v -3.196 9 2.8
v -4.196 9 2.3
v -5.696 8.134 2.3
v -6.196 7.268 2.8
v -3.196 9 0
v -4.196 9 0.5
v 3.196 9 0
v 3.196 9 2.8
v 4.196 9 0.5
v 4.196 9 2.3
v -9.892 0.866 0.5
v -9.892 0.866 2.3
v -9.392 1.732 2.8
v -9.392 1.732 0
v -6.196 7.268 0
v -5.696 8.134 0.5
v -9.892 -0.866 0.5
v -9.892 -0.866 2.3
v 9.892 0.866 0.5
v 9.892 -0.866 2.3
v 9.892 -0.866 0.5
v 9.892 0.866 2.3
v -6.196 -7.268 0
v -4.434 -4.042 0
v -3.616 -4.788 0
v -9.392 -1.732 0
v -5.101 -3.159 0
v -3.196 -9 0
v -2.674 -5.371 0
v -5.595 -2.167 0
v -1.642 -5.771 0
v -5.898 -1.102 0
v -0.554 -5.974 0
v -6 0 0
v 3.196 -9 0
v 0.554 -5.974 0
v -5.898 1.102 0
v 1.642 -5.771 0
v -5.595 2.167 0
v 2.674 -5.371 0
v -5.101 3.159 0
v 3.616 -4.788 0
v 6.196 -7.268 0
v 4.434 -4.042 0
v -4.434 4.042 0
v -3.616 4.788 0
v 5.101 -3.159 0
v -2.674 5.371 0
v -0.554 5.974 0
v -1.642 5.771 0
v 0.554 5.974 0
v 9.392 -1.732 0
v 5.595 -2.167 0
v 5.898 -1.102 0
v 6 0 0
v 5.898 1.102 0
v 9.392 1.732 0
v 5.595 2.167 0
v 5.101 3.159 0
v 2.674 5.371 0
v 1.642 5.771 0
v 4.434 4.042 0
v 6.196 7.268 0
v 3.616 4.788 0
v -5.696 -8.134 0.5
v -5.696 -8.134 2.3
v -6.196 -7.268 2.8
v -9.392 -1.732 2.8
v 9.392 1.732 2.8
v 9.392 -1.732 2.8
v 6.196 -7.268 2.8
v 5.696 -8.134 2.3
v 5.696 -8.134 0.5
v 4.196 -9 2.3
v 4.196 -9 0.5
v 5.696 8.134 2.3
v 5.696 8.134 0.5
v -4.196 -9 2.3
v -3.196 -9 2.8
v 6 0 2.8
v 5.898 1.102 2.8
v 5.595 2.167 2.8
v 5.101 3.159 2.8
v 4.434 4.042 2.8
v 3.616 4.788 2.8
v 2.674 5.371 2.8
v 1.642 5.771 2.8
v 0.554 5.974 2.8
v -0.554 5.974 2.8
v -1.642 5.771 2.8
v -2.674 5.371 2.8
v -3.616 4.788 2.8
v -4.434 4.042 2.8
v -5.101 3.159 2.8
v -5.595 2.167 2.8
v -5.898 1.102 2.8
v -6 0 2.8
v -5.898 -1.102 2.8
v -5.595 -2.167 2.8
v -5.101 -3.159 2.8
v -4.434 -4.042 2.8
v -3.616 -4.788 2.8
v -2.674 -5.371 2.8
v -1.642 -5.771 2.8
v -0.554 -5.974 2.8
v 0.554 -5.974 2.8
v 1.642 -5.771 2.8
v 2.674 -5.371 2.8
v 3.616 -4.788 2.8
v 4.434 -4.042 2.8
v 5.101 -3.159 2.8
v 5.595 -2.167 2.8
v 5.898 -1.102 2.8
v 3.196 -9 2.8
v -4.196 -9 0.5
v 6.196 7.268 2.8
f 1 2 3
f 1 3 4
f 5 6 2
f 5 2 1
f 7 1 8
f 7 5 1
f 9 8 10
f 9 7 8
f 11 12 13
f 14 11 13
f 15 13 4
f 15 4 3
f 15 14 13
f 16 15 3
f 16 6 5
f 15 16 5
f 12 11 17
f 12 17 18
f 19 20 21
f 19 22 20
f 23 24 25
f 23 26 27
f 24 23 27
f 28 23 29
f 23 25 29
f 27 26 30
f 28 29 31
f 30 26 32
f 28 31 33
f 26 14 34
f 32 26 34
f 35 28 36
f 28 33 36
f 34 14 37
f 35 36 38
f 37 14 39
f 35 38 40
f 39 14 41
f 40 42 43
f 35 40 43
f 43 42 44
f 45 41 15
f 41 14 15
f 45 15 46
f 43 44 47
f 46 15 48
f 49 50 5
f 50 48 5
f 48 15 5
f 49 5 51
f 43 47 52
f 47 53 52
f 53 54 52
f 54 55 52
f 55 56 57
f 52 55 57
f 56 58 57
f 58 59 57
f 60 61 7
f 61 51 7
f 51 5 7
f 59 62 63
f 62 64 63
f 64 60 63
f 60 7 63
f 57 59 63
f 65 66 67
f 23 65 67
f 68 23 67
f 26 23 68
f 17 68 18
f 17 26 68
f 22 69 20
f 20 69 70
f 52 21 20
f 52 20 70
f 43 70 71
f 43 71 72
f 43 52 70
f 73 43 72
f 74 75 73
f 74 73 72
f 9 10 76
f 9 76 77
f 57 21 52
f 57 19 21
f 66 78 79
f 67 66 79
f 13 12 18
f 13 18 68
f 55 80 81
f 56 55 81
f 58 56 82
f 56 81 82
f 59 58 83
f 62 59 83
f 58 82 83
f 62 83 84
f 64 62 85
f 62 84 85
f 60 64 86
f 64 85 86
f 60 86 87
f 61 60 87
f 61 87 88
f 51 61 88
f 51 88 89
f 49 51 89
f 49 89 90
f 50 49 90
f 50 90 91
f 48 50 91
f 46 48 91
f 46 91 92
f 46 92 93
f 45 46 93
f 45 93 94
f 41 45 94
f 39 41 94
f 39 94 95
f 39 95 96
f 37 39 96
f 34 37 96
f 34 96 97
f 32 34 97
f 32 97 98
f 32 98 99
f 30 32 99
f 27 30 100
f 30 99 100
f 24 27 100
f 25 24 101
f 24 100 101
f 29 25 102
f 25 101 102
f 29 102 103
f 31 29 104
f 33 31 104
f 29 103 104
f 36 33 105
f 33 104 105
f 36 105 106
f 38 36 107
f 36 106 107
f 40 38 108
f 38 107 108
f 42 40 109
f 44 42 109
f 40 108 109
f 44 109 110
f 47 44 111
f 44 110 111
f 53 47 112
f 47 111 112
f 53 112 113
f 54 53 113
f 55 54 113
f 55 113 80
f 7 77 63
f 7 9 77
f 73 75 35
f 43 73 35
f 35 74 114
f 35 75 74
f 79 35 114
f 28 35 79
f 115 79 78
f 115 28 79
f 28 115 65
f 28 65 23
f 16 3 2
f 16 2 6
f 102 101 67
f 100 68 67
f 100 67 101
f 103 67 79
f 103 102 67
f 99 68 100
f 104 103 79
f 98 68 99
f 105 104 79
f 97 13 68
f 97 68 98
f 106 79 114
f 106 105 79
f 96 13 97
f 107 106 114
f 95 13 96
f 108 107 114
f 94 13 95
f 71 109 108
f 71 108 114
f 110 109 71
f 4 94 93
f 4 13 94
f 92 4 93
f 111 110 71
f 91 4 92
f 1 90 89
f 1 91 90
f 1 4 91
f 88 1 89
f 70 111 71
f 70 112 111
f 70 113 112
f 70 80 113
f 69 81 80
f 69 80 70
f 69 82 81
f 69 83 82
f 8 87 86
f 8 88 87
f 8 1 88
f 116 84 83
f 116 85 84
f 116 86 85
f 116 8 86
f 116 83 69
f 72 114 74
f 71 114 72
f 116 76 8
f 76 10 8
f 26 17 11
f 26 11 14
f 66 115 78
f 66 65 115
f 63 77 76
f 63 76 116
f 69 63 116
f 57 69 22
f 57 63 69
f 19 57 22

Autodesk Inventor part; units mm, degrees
ref_plane "YZ Plane" through (0, 0, 0) normal (1, 0, 0) x (0, 1, 0)
ref_plane "XZ Plane" through (0, 0, 0) normal (0, 1, 0) x (-1, 0, 0)
ref_plane "XY Plane" through (0, 0, 0) normal (0, 0, 1) x (1, 0, 0)
sketch "Sketch1" plane through (0, 0, 0) normal (0, 0, 1) x (1, 0, 0)
  line L0 (10.3923, 0) -> (5.1962, -9)
  line L1 (5.1962, -9) -> (-5.1962, -9)
  line L2 (-5.1962, -9) -> (-10.3923, 0)
  line L3 (-10.3923, 0) -> (-5.1962, 9)
  line L4 (-5.1962, 9) -> (5.1962, 9)
  line L5 (5.1962, 9) -> (10.3923, 0)
  point P0 (0, 0)
  point P1 (0, 0)
  dimension "d0" = 18
extrude "Extrusion1" add sketch "Sketch1" along normal blind 2.8
sketch "Sketch2" plane through (0, 0, 2.8) normal (0, 0, 1) x (1, 0, 0)
  circle A0 centre (0, 0) radius 6
  dimension "d3" = 12
extrude "Extrusion2" cut sketch "Sketch2" against normal through all
chamfer "Chamfer1" distance 1 angle 45 6 edges at (5.1962, 9, 1.4) (-5.1962, 9, 1.4) (10.3923, 0, 1.4) (5.1962, -9, 1.4) (-5.1962, -9, 1.4) (-10.3923, 0, 1.4)
chamfer "Chamfer2" distance 0.5 angle 45 12 edges at (-9.8923, 0, 2.8) (-4.9462, -8.567, 2.8) (4.9462, -8.567, 2.8) (9.8923, 0, 2.8) (4.9462, 8.567, 2.8) (-4.9462, 8.567, 2.8) (-4.9462, 8.567, 0) (-9.8923, 0, 0) (-4.9462, -8.567, 0) (4.9462, -8.567, 0) (9.8923, 0, 0) (4.9462, 8.567, 0)
properties part number "c-t4140012051-000-a-3d_NUT"
